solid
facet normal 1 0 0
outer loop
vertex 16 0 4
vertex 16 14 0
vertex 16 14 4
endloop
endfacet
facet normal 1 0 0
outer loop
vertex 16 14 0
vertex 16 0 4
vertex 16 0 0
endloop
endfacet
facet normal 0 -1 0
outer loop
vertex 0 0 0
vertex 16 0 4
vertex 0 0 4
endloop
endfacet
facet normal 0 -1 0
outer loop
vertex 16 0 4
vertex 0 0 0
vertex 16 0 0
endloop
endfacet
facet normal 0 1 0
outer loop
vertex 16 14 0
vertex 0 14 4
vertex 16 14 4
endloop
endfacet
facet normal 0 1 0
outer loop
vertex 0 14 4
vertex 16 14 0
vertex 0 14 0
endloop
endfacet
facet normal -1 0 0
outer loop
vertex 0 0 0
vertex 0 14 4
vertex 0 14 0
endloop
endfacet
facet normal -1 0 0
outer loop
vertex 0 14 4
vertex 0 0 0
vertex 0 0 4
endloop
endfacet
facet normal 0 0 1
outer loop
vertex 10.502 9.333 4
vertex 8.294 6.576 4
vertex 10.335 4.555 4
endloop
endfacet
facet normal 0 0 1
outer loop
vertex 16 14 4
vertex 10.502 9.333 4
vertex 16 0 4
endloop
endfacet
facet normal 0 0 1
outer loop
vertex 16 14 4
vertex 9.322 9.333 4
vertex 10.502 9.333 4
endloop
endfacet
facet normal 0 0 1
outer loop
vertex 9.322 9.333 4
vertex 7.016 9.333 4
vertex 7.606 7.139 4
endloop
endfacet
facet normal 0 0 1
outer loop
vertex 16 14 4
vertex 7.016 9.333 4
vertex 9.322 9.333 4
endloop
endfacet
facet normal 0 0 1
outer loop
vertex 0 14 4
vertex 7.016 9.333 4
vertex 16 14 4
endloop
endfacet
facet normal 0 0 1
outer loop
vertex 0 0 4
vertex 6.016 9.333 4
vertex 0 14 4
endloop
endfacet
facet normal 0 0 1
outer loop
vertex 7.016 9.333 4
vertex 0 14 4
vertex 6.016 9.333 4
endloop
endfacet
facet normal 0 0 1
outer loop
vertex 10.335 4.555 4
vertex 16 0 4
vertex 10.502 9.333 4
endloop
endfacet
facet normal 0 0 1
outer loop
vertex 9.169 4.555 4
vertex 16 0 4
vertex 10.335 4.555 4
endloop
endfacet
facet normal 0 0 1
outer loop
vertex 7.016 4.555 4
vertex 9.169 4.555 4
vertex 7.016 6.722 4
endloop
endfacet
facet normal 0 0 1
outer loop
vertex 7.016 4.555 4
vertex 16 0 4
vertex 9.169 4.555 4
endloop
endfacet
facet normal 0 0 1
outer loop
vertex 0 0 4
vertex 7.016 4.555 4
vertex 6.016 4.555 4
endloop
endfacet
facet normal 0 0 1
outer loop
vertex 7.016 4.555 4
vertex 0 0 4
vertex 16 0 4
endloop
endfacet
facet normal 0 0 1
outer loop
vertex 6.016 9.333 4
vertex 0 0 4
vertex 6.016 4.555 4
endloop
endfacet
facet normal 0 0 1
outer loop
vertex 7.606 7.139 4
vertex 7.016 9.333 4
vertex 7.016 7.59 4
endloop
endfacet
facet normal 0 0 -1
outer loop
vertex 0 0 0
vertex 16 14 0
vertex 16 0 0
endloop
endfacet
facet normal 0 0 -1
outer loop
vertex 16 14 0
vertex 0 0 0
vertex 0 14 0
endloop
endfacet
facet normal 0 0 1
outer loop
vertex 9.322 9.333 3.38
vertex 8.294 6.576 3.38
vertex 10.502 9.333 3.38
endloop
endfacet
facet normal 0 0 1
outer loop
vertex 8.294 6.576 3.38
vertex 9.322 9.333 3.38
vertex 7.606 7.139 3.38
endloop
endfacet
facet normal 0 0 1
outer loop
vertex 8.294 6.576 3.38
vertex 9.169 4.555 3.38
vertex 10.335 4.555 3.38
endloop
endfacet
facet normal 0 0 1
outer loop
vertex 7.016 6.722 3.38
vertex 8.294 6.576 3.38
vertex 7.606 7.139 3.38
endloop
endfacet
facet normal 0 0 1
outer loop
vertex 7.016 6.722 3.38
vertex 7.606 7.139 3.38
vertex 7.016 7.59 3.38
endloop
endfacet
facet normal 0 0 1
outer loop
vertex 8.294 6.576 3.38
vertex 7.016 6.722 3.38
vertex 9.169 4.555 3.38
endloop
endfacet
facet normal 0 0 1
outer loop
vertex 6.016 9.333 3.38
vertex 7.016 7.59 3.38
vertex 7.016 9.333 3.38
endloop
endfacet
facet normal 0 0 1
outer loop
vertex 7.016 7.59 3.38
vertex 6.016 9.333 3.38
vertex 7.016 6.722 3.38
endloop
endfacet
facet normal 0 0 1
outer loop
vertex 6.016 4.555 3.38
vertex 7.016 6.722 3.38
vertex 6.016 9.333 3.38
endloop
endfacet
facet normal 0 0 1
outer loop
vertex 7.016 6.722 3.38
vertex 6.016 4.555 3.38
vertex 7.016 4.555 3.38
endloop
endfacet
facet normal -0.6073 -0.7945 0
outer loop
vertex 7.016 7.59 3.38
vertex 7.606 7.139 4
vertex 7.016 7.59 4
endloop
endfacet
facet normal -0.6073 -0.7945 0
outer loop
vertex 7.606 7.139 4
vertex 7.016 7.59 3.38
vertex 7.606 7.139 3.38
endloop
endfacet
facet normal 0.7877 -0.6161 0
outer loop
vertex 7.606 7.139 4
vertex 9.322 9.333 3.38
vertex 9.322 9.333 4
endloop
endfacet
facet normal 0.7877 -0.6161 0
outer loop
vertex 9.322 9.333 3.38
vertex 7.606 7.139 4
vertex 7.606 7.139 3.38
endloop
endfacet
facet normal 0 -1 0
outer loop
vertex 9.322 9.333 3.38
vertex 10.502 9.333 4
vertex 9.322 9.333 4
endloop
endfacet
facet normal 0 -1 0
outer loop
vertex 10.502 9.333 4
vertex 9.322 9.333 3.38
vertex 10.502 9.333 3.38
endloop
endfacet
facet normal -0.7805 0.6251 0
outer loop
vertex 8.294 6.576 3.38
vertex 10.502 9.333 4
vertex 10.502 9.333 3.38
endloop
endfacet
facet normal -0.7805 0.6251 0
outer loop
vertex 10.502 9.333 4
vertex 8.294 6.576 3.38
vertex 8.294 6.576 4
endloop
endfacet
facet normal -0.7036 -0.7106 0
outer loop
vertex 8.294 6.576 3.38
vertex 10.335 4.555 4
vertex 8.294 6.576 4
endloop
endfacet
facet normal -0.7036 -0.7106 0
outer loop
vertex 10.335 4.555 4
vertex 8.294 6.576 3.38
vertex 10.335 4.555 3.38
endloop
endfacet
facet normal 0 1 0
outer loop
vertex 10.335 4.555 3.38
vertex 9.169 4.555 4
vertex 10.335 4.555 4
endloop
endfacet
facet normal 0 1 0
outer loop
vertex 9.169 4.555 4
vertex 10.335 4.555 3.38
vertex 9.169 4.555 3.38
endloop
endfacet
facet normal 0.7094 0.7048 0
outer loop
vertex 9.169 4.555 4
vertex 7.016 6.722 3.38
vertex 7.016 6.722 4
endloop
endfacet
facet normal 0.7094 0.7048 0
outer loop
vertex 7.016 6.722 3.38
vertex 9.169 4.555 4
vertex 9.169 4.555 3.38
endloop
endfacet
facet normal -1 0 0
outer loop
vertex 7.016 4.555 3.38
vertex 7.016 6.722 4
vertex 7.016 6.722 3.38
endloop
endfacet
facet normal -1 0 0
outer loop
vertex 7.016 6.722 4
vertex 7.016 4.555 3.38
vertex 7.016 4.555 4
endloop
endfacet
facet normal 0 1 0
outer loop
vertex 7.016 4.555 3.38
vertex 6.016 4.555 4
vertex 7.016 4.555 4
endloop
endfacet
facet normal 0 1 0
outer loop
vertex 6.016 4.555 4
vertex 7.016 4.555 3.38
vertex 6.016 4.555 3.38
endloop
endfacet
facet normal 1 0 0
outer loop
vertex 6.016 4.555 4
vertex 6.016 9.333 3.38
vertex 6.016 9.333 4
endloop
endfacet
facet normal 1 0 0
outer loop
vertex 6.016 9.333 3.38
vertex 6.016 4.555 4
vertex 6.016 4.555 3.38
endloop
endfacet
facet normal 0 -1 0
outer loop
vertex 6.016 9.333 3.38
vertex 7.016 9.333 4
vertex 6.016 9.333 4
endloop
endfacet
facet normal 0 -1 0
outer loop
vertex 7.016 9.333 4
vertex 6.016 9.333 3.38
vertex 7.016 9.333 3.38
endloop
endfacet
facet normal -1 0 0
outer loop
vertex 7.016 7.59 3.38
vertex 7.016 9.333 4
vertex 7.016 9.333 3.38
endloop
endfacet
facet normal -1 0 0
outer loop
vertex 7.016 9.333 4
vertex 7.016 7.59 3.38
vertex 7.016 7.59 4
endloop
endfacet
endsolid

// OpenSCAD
use <../../../tec_cold_block_mockup.scad>

support_keeper_export();
